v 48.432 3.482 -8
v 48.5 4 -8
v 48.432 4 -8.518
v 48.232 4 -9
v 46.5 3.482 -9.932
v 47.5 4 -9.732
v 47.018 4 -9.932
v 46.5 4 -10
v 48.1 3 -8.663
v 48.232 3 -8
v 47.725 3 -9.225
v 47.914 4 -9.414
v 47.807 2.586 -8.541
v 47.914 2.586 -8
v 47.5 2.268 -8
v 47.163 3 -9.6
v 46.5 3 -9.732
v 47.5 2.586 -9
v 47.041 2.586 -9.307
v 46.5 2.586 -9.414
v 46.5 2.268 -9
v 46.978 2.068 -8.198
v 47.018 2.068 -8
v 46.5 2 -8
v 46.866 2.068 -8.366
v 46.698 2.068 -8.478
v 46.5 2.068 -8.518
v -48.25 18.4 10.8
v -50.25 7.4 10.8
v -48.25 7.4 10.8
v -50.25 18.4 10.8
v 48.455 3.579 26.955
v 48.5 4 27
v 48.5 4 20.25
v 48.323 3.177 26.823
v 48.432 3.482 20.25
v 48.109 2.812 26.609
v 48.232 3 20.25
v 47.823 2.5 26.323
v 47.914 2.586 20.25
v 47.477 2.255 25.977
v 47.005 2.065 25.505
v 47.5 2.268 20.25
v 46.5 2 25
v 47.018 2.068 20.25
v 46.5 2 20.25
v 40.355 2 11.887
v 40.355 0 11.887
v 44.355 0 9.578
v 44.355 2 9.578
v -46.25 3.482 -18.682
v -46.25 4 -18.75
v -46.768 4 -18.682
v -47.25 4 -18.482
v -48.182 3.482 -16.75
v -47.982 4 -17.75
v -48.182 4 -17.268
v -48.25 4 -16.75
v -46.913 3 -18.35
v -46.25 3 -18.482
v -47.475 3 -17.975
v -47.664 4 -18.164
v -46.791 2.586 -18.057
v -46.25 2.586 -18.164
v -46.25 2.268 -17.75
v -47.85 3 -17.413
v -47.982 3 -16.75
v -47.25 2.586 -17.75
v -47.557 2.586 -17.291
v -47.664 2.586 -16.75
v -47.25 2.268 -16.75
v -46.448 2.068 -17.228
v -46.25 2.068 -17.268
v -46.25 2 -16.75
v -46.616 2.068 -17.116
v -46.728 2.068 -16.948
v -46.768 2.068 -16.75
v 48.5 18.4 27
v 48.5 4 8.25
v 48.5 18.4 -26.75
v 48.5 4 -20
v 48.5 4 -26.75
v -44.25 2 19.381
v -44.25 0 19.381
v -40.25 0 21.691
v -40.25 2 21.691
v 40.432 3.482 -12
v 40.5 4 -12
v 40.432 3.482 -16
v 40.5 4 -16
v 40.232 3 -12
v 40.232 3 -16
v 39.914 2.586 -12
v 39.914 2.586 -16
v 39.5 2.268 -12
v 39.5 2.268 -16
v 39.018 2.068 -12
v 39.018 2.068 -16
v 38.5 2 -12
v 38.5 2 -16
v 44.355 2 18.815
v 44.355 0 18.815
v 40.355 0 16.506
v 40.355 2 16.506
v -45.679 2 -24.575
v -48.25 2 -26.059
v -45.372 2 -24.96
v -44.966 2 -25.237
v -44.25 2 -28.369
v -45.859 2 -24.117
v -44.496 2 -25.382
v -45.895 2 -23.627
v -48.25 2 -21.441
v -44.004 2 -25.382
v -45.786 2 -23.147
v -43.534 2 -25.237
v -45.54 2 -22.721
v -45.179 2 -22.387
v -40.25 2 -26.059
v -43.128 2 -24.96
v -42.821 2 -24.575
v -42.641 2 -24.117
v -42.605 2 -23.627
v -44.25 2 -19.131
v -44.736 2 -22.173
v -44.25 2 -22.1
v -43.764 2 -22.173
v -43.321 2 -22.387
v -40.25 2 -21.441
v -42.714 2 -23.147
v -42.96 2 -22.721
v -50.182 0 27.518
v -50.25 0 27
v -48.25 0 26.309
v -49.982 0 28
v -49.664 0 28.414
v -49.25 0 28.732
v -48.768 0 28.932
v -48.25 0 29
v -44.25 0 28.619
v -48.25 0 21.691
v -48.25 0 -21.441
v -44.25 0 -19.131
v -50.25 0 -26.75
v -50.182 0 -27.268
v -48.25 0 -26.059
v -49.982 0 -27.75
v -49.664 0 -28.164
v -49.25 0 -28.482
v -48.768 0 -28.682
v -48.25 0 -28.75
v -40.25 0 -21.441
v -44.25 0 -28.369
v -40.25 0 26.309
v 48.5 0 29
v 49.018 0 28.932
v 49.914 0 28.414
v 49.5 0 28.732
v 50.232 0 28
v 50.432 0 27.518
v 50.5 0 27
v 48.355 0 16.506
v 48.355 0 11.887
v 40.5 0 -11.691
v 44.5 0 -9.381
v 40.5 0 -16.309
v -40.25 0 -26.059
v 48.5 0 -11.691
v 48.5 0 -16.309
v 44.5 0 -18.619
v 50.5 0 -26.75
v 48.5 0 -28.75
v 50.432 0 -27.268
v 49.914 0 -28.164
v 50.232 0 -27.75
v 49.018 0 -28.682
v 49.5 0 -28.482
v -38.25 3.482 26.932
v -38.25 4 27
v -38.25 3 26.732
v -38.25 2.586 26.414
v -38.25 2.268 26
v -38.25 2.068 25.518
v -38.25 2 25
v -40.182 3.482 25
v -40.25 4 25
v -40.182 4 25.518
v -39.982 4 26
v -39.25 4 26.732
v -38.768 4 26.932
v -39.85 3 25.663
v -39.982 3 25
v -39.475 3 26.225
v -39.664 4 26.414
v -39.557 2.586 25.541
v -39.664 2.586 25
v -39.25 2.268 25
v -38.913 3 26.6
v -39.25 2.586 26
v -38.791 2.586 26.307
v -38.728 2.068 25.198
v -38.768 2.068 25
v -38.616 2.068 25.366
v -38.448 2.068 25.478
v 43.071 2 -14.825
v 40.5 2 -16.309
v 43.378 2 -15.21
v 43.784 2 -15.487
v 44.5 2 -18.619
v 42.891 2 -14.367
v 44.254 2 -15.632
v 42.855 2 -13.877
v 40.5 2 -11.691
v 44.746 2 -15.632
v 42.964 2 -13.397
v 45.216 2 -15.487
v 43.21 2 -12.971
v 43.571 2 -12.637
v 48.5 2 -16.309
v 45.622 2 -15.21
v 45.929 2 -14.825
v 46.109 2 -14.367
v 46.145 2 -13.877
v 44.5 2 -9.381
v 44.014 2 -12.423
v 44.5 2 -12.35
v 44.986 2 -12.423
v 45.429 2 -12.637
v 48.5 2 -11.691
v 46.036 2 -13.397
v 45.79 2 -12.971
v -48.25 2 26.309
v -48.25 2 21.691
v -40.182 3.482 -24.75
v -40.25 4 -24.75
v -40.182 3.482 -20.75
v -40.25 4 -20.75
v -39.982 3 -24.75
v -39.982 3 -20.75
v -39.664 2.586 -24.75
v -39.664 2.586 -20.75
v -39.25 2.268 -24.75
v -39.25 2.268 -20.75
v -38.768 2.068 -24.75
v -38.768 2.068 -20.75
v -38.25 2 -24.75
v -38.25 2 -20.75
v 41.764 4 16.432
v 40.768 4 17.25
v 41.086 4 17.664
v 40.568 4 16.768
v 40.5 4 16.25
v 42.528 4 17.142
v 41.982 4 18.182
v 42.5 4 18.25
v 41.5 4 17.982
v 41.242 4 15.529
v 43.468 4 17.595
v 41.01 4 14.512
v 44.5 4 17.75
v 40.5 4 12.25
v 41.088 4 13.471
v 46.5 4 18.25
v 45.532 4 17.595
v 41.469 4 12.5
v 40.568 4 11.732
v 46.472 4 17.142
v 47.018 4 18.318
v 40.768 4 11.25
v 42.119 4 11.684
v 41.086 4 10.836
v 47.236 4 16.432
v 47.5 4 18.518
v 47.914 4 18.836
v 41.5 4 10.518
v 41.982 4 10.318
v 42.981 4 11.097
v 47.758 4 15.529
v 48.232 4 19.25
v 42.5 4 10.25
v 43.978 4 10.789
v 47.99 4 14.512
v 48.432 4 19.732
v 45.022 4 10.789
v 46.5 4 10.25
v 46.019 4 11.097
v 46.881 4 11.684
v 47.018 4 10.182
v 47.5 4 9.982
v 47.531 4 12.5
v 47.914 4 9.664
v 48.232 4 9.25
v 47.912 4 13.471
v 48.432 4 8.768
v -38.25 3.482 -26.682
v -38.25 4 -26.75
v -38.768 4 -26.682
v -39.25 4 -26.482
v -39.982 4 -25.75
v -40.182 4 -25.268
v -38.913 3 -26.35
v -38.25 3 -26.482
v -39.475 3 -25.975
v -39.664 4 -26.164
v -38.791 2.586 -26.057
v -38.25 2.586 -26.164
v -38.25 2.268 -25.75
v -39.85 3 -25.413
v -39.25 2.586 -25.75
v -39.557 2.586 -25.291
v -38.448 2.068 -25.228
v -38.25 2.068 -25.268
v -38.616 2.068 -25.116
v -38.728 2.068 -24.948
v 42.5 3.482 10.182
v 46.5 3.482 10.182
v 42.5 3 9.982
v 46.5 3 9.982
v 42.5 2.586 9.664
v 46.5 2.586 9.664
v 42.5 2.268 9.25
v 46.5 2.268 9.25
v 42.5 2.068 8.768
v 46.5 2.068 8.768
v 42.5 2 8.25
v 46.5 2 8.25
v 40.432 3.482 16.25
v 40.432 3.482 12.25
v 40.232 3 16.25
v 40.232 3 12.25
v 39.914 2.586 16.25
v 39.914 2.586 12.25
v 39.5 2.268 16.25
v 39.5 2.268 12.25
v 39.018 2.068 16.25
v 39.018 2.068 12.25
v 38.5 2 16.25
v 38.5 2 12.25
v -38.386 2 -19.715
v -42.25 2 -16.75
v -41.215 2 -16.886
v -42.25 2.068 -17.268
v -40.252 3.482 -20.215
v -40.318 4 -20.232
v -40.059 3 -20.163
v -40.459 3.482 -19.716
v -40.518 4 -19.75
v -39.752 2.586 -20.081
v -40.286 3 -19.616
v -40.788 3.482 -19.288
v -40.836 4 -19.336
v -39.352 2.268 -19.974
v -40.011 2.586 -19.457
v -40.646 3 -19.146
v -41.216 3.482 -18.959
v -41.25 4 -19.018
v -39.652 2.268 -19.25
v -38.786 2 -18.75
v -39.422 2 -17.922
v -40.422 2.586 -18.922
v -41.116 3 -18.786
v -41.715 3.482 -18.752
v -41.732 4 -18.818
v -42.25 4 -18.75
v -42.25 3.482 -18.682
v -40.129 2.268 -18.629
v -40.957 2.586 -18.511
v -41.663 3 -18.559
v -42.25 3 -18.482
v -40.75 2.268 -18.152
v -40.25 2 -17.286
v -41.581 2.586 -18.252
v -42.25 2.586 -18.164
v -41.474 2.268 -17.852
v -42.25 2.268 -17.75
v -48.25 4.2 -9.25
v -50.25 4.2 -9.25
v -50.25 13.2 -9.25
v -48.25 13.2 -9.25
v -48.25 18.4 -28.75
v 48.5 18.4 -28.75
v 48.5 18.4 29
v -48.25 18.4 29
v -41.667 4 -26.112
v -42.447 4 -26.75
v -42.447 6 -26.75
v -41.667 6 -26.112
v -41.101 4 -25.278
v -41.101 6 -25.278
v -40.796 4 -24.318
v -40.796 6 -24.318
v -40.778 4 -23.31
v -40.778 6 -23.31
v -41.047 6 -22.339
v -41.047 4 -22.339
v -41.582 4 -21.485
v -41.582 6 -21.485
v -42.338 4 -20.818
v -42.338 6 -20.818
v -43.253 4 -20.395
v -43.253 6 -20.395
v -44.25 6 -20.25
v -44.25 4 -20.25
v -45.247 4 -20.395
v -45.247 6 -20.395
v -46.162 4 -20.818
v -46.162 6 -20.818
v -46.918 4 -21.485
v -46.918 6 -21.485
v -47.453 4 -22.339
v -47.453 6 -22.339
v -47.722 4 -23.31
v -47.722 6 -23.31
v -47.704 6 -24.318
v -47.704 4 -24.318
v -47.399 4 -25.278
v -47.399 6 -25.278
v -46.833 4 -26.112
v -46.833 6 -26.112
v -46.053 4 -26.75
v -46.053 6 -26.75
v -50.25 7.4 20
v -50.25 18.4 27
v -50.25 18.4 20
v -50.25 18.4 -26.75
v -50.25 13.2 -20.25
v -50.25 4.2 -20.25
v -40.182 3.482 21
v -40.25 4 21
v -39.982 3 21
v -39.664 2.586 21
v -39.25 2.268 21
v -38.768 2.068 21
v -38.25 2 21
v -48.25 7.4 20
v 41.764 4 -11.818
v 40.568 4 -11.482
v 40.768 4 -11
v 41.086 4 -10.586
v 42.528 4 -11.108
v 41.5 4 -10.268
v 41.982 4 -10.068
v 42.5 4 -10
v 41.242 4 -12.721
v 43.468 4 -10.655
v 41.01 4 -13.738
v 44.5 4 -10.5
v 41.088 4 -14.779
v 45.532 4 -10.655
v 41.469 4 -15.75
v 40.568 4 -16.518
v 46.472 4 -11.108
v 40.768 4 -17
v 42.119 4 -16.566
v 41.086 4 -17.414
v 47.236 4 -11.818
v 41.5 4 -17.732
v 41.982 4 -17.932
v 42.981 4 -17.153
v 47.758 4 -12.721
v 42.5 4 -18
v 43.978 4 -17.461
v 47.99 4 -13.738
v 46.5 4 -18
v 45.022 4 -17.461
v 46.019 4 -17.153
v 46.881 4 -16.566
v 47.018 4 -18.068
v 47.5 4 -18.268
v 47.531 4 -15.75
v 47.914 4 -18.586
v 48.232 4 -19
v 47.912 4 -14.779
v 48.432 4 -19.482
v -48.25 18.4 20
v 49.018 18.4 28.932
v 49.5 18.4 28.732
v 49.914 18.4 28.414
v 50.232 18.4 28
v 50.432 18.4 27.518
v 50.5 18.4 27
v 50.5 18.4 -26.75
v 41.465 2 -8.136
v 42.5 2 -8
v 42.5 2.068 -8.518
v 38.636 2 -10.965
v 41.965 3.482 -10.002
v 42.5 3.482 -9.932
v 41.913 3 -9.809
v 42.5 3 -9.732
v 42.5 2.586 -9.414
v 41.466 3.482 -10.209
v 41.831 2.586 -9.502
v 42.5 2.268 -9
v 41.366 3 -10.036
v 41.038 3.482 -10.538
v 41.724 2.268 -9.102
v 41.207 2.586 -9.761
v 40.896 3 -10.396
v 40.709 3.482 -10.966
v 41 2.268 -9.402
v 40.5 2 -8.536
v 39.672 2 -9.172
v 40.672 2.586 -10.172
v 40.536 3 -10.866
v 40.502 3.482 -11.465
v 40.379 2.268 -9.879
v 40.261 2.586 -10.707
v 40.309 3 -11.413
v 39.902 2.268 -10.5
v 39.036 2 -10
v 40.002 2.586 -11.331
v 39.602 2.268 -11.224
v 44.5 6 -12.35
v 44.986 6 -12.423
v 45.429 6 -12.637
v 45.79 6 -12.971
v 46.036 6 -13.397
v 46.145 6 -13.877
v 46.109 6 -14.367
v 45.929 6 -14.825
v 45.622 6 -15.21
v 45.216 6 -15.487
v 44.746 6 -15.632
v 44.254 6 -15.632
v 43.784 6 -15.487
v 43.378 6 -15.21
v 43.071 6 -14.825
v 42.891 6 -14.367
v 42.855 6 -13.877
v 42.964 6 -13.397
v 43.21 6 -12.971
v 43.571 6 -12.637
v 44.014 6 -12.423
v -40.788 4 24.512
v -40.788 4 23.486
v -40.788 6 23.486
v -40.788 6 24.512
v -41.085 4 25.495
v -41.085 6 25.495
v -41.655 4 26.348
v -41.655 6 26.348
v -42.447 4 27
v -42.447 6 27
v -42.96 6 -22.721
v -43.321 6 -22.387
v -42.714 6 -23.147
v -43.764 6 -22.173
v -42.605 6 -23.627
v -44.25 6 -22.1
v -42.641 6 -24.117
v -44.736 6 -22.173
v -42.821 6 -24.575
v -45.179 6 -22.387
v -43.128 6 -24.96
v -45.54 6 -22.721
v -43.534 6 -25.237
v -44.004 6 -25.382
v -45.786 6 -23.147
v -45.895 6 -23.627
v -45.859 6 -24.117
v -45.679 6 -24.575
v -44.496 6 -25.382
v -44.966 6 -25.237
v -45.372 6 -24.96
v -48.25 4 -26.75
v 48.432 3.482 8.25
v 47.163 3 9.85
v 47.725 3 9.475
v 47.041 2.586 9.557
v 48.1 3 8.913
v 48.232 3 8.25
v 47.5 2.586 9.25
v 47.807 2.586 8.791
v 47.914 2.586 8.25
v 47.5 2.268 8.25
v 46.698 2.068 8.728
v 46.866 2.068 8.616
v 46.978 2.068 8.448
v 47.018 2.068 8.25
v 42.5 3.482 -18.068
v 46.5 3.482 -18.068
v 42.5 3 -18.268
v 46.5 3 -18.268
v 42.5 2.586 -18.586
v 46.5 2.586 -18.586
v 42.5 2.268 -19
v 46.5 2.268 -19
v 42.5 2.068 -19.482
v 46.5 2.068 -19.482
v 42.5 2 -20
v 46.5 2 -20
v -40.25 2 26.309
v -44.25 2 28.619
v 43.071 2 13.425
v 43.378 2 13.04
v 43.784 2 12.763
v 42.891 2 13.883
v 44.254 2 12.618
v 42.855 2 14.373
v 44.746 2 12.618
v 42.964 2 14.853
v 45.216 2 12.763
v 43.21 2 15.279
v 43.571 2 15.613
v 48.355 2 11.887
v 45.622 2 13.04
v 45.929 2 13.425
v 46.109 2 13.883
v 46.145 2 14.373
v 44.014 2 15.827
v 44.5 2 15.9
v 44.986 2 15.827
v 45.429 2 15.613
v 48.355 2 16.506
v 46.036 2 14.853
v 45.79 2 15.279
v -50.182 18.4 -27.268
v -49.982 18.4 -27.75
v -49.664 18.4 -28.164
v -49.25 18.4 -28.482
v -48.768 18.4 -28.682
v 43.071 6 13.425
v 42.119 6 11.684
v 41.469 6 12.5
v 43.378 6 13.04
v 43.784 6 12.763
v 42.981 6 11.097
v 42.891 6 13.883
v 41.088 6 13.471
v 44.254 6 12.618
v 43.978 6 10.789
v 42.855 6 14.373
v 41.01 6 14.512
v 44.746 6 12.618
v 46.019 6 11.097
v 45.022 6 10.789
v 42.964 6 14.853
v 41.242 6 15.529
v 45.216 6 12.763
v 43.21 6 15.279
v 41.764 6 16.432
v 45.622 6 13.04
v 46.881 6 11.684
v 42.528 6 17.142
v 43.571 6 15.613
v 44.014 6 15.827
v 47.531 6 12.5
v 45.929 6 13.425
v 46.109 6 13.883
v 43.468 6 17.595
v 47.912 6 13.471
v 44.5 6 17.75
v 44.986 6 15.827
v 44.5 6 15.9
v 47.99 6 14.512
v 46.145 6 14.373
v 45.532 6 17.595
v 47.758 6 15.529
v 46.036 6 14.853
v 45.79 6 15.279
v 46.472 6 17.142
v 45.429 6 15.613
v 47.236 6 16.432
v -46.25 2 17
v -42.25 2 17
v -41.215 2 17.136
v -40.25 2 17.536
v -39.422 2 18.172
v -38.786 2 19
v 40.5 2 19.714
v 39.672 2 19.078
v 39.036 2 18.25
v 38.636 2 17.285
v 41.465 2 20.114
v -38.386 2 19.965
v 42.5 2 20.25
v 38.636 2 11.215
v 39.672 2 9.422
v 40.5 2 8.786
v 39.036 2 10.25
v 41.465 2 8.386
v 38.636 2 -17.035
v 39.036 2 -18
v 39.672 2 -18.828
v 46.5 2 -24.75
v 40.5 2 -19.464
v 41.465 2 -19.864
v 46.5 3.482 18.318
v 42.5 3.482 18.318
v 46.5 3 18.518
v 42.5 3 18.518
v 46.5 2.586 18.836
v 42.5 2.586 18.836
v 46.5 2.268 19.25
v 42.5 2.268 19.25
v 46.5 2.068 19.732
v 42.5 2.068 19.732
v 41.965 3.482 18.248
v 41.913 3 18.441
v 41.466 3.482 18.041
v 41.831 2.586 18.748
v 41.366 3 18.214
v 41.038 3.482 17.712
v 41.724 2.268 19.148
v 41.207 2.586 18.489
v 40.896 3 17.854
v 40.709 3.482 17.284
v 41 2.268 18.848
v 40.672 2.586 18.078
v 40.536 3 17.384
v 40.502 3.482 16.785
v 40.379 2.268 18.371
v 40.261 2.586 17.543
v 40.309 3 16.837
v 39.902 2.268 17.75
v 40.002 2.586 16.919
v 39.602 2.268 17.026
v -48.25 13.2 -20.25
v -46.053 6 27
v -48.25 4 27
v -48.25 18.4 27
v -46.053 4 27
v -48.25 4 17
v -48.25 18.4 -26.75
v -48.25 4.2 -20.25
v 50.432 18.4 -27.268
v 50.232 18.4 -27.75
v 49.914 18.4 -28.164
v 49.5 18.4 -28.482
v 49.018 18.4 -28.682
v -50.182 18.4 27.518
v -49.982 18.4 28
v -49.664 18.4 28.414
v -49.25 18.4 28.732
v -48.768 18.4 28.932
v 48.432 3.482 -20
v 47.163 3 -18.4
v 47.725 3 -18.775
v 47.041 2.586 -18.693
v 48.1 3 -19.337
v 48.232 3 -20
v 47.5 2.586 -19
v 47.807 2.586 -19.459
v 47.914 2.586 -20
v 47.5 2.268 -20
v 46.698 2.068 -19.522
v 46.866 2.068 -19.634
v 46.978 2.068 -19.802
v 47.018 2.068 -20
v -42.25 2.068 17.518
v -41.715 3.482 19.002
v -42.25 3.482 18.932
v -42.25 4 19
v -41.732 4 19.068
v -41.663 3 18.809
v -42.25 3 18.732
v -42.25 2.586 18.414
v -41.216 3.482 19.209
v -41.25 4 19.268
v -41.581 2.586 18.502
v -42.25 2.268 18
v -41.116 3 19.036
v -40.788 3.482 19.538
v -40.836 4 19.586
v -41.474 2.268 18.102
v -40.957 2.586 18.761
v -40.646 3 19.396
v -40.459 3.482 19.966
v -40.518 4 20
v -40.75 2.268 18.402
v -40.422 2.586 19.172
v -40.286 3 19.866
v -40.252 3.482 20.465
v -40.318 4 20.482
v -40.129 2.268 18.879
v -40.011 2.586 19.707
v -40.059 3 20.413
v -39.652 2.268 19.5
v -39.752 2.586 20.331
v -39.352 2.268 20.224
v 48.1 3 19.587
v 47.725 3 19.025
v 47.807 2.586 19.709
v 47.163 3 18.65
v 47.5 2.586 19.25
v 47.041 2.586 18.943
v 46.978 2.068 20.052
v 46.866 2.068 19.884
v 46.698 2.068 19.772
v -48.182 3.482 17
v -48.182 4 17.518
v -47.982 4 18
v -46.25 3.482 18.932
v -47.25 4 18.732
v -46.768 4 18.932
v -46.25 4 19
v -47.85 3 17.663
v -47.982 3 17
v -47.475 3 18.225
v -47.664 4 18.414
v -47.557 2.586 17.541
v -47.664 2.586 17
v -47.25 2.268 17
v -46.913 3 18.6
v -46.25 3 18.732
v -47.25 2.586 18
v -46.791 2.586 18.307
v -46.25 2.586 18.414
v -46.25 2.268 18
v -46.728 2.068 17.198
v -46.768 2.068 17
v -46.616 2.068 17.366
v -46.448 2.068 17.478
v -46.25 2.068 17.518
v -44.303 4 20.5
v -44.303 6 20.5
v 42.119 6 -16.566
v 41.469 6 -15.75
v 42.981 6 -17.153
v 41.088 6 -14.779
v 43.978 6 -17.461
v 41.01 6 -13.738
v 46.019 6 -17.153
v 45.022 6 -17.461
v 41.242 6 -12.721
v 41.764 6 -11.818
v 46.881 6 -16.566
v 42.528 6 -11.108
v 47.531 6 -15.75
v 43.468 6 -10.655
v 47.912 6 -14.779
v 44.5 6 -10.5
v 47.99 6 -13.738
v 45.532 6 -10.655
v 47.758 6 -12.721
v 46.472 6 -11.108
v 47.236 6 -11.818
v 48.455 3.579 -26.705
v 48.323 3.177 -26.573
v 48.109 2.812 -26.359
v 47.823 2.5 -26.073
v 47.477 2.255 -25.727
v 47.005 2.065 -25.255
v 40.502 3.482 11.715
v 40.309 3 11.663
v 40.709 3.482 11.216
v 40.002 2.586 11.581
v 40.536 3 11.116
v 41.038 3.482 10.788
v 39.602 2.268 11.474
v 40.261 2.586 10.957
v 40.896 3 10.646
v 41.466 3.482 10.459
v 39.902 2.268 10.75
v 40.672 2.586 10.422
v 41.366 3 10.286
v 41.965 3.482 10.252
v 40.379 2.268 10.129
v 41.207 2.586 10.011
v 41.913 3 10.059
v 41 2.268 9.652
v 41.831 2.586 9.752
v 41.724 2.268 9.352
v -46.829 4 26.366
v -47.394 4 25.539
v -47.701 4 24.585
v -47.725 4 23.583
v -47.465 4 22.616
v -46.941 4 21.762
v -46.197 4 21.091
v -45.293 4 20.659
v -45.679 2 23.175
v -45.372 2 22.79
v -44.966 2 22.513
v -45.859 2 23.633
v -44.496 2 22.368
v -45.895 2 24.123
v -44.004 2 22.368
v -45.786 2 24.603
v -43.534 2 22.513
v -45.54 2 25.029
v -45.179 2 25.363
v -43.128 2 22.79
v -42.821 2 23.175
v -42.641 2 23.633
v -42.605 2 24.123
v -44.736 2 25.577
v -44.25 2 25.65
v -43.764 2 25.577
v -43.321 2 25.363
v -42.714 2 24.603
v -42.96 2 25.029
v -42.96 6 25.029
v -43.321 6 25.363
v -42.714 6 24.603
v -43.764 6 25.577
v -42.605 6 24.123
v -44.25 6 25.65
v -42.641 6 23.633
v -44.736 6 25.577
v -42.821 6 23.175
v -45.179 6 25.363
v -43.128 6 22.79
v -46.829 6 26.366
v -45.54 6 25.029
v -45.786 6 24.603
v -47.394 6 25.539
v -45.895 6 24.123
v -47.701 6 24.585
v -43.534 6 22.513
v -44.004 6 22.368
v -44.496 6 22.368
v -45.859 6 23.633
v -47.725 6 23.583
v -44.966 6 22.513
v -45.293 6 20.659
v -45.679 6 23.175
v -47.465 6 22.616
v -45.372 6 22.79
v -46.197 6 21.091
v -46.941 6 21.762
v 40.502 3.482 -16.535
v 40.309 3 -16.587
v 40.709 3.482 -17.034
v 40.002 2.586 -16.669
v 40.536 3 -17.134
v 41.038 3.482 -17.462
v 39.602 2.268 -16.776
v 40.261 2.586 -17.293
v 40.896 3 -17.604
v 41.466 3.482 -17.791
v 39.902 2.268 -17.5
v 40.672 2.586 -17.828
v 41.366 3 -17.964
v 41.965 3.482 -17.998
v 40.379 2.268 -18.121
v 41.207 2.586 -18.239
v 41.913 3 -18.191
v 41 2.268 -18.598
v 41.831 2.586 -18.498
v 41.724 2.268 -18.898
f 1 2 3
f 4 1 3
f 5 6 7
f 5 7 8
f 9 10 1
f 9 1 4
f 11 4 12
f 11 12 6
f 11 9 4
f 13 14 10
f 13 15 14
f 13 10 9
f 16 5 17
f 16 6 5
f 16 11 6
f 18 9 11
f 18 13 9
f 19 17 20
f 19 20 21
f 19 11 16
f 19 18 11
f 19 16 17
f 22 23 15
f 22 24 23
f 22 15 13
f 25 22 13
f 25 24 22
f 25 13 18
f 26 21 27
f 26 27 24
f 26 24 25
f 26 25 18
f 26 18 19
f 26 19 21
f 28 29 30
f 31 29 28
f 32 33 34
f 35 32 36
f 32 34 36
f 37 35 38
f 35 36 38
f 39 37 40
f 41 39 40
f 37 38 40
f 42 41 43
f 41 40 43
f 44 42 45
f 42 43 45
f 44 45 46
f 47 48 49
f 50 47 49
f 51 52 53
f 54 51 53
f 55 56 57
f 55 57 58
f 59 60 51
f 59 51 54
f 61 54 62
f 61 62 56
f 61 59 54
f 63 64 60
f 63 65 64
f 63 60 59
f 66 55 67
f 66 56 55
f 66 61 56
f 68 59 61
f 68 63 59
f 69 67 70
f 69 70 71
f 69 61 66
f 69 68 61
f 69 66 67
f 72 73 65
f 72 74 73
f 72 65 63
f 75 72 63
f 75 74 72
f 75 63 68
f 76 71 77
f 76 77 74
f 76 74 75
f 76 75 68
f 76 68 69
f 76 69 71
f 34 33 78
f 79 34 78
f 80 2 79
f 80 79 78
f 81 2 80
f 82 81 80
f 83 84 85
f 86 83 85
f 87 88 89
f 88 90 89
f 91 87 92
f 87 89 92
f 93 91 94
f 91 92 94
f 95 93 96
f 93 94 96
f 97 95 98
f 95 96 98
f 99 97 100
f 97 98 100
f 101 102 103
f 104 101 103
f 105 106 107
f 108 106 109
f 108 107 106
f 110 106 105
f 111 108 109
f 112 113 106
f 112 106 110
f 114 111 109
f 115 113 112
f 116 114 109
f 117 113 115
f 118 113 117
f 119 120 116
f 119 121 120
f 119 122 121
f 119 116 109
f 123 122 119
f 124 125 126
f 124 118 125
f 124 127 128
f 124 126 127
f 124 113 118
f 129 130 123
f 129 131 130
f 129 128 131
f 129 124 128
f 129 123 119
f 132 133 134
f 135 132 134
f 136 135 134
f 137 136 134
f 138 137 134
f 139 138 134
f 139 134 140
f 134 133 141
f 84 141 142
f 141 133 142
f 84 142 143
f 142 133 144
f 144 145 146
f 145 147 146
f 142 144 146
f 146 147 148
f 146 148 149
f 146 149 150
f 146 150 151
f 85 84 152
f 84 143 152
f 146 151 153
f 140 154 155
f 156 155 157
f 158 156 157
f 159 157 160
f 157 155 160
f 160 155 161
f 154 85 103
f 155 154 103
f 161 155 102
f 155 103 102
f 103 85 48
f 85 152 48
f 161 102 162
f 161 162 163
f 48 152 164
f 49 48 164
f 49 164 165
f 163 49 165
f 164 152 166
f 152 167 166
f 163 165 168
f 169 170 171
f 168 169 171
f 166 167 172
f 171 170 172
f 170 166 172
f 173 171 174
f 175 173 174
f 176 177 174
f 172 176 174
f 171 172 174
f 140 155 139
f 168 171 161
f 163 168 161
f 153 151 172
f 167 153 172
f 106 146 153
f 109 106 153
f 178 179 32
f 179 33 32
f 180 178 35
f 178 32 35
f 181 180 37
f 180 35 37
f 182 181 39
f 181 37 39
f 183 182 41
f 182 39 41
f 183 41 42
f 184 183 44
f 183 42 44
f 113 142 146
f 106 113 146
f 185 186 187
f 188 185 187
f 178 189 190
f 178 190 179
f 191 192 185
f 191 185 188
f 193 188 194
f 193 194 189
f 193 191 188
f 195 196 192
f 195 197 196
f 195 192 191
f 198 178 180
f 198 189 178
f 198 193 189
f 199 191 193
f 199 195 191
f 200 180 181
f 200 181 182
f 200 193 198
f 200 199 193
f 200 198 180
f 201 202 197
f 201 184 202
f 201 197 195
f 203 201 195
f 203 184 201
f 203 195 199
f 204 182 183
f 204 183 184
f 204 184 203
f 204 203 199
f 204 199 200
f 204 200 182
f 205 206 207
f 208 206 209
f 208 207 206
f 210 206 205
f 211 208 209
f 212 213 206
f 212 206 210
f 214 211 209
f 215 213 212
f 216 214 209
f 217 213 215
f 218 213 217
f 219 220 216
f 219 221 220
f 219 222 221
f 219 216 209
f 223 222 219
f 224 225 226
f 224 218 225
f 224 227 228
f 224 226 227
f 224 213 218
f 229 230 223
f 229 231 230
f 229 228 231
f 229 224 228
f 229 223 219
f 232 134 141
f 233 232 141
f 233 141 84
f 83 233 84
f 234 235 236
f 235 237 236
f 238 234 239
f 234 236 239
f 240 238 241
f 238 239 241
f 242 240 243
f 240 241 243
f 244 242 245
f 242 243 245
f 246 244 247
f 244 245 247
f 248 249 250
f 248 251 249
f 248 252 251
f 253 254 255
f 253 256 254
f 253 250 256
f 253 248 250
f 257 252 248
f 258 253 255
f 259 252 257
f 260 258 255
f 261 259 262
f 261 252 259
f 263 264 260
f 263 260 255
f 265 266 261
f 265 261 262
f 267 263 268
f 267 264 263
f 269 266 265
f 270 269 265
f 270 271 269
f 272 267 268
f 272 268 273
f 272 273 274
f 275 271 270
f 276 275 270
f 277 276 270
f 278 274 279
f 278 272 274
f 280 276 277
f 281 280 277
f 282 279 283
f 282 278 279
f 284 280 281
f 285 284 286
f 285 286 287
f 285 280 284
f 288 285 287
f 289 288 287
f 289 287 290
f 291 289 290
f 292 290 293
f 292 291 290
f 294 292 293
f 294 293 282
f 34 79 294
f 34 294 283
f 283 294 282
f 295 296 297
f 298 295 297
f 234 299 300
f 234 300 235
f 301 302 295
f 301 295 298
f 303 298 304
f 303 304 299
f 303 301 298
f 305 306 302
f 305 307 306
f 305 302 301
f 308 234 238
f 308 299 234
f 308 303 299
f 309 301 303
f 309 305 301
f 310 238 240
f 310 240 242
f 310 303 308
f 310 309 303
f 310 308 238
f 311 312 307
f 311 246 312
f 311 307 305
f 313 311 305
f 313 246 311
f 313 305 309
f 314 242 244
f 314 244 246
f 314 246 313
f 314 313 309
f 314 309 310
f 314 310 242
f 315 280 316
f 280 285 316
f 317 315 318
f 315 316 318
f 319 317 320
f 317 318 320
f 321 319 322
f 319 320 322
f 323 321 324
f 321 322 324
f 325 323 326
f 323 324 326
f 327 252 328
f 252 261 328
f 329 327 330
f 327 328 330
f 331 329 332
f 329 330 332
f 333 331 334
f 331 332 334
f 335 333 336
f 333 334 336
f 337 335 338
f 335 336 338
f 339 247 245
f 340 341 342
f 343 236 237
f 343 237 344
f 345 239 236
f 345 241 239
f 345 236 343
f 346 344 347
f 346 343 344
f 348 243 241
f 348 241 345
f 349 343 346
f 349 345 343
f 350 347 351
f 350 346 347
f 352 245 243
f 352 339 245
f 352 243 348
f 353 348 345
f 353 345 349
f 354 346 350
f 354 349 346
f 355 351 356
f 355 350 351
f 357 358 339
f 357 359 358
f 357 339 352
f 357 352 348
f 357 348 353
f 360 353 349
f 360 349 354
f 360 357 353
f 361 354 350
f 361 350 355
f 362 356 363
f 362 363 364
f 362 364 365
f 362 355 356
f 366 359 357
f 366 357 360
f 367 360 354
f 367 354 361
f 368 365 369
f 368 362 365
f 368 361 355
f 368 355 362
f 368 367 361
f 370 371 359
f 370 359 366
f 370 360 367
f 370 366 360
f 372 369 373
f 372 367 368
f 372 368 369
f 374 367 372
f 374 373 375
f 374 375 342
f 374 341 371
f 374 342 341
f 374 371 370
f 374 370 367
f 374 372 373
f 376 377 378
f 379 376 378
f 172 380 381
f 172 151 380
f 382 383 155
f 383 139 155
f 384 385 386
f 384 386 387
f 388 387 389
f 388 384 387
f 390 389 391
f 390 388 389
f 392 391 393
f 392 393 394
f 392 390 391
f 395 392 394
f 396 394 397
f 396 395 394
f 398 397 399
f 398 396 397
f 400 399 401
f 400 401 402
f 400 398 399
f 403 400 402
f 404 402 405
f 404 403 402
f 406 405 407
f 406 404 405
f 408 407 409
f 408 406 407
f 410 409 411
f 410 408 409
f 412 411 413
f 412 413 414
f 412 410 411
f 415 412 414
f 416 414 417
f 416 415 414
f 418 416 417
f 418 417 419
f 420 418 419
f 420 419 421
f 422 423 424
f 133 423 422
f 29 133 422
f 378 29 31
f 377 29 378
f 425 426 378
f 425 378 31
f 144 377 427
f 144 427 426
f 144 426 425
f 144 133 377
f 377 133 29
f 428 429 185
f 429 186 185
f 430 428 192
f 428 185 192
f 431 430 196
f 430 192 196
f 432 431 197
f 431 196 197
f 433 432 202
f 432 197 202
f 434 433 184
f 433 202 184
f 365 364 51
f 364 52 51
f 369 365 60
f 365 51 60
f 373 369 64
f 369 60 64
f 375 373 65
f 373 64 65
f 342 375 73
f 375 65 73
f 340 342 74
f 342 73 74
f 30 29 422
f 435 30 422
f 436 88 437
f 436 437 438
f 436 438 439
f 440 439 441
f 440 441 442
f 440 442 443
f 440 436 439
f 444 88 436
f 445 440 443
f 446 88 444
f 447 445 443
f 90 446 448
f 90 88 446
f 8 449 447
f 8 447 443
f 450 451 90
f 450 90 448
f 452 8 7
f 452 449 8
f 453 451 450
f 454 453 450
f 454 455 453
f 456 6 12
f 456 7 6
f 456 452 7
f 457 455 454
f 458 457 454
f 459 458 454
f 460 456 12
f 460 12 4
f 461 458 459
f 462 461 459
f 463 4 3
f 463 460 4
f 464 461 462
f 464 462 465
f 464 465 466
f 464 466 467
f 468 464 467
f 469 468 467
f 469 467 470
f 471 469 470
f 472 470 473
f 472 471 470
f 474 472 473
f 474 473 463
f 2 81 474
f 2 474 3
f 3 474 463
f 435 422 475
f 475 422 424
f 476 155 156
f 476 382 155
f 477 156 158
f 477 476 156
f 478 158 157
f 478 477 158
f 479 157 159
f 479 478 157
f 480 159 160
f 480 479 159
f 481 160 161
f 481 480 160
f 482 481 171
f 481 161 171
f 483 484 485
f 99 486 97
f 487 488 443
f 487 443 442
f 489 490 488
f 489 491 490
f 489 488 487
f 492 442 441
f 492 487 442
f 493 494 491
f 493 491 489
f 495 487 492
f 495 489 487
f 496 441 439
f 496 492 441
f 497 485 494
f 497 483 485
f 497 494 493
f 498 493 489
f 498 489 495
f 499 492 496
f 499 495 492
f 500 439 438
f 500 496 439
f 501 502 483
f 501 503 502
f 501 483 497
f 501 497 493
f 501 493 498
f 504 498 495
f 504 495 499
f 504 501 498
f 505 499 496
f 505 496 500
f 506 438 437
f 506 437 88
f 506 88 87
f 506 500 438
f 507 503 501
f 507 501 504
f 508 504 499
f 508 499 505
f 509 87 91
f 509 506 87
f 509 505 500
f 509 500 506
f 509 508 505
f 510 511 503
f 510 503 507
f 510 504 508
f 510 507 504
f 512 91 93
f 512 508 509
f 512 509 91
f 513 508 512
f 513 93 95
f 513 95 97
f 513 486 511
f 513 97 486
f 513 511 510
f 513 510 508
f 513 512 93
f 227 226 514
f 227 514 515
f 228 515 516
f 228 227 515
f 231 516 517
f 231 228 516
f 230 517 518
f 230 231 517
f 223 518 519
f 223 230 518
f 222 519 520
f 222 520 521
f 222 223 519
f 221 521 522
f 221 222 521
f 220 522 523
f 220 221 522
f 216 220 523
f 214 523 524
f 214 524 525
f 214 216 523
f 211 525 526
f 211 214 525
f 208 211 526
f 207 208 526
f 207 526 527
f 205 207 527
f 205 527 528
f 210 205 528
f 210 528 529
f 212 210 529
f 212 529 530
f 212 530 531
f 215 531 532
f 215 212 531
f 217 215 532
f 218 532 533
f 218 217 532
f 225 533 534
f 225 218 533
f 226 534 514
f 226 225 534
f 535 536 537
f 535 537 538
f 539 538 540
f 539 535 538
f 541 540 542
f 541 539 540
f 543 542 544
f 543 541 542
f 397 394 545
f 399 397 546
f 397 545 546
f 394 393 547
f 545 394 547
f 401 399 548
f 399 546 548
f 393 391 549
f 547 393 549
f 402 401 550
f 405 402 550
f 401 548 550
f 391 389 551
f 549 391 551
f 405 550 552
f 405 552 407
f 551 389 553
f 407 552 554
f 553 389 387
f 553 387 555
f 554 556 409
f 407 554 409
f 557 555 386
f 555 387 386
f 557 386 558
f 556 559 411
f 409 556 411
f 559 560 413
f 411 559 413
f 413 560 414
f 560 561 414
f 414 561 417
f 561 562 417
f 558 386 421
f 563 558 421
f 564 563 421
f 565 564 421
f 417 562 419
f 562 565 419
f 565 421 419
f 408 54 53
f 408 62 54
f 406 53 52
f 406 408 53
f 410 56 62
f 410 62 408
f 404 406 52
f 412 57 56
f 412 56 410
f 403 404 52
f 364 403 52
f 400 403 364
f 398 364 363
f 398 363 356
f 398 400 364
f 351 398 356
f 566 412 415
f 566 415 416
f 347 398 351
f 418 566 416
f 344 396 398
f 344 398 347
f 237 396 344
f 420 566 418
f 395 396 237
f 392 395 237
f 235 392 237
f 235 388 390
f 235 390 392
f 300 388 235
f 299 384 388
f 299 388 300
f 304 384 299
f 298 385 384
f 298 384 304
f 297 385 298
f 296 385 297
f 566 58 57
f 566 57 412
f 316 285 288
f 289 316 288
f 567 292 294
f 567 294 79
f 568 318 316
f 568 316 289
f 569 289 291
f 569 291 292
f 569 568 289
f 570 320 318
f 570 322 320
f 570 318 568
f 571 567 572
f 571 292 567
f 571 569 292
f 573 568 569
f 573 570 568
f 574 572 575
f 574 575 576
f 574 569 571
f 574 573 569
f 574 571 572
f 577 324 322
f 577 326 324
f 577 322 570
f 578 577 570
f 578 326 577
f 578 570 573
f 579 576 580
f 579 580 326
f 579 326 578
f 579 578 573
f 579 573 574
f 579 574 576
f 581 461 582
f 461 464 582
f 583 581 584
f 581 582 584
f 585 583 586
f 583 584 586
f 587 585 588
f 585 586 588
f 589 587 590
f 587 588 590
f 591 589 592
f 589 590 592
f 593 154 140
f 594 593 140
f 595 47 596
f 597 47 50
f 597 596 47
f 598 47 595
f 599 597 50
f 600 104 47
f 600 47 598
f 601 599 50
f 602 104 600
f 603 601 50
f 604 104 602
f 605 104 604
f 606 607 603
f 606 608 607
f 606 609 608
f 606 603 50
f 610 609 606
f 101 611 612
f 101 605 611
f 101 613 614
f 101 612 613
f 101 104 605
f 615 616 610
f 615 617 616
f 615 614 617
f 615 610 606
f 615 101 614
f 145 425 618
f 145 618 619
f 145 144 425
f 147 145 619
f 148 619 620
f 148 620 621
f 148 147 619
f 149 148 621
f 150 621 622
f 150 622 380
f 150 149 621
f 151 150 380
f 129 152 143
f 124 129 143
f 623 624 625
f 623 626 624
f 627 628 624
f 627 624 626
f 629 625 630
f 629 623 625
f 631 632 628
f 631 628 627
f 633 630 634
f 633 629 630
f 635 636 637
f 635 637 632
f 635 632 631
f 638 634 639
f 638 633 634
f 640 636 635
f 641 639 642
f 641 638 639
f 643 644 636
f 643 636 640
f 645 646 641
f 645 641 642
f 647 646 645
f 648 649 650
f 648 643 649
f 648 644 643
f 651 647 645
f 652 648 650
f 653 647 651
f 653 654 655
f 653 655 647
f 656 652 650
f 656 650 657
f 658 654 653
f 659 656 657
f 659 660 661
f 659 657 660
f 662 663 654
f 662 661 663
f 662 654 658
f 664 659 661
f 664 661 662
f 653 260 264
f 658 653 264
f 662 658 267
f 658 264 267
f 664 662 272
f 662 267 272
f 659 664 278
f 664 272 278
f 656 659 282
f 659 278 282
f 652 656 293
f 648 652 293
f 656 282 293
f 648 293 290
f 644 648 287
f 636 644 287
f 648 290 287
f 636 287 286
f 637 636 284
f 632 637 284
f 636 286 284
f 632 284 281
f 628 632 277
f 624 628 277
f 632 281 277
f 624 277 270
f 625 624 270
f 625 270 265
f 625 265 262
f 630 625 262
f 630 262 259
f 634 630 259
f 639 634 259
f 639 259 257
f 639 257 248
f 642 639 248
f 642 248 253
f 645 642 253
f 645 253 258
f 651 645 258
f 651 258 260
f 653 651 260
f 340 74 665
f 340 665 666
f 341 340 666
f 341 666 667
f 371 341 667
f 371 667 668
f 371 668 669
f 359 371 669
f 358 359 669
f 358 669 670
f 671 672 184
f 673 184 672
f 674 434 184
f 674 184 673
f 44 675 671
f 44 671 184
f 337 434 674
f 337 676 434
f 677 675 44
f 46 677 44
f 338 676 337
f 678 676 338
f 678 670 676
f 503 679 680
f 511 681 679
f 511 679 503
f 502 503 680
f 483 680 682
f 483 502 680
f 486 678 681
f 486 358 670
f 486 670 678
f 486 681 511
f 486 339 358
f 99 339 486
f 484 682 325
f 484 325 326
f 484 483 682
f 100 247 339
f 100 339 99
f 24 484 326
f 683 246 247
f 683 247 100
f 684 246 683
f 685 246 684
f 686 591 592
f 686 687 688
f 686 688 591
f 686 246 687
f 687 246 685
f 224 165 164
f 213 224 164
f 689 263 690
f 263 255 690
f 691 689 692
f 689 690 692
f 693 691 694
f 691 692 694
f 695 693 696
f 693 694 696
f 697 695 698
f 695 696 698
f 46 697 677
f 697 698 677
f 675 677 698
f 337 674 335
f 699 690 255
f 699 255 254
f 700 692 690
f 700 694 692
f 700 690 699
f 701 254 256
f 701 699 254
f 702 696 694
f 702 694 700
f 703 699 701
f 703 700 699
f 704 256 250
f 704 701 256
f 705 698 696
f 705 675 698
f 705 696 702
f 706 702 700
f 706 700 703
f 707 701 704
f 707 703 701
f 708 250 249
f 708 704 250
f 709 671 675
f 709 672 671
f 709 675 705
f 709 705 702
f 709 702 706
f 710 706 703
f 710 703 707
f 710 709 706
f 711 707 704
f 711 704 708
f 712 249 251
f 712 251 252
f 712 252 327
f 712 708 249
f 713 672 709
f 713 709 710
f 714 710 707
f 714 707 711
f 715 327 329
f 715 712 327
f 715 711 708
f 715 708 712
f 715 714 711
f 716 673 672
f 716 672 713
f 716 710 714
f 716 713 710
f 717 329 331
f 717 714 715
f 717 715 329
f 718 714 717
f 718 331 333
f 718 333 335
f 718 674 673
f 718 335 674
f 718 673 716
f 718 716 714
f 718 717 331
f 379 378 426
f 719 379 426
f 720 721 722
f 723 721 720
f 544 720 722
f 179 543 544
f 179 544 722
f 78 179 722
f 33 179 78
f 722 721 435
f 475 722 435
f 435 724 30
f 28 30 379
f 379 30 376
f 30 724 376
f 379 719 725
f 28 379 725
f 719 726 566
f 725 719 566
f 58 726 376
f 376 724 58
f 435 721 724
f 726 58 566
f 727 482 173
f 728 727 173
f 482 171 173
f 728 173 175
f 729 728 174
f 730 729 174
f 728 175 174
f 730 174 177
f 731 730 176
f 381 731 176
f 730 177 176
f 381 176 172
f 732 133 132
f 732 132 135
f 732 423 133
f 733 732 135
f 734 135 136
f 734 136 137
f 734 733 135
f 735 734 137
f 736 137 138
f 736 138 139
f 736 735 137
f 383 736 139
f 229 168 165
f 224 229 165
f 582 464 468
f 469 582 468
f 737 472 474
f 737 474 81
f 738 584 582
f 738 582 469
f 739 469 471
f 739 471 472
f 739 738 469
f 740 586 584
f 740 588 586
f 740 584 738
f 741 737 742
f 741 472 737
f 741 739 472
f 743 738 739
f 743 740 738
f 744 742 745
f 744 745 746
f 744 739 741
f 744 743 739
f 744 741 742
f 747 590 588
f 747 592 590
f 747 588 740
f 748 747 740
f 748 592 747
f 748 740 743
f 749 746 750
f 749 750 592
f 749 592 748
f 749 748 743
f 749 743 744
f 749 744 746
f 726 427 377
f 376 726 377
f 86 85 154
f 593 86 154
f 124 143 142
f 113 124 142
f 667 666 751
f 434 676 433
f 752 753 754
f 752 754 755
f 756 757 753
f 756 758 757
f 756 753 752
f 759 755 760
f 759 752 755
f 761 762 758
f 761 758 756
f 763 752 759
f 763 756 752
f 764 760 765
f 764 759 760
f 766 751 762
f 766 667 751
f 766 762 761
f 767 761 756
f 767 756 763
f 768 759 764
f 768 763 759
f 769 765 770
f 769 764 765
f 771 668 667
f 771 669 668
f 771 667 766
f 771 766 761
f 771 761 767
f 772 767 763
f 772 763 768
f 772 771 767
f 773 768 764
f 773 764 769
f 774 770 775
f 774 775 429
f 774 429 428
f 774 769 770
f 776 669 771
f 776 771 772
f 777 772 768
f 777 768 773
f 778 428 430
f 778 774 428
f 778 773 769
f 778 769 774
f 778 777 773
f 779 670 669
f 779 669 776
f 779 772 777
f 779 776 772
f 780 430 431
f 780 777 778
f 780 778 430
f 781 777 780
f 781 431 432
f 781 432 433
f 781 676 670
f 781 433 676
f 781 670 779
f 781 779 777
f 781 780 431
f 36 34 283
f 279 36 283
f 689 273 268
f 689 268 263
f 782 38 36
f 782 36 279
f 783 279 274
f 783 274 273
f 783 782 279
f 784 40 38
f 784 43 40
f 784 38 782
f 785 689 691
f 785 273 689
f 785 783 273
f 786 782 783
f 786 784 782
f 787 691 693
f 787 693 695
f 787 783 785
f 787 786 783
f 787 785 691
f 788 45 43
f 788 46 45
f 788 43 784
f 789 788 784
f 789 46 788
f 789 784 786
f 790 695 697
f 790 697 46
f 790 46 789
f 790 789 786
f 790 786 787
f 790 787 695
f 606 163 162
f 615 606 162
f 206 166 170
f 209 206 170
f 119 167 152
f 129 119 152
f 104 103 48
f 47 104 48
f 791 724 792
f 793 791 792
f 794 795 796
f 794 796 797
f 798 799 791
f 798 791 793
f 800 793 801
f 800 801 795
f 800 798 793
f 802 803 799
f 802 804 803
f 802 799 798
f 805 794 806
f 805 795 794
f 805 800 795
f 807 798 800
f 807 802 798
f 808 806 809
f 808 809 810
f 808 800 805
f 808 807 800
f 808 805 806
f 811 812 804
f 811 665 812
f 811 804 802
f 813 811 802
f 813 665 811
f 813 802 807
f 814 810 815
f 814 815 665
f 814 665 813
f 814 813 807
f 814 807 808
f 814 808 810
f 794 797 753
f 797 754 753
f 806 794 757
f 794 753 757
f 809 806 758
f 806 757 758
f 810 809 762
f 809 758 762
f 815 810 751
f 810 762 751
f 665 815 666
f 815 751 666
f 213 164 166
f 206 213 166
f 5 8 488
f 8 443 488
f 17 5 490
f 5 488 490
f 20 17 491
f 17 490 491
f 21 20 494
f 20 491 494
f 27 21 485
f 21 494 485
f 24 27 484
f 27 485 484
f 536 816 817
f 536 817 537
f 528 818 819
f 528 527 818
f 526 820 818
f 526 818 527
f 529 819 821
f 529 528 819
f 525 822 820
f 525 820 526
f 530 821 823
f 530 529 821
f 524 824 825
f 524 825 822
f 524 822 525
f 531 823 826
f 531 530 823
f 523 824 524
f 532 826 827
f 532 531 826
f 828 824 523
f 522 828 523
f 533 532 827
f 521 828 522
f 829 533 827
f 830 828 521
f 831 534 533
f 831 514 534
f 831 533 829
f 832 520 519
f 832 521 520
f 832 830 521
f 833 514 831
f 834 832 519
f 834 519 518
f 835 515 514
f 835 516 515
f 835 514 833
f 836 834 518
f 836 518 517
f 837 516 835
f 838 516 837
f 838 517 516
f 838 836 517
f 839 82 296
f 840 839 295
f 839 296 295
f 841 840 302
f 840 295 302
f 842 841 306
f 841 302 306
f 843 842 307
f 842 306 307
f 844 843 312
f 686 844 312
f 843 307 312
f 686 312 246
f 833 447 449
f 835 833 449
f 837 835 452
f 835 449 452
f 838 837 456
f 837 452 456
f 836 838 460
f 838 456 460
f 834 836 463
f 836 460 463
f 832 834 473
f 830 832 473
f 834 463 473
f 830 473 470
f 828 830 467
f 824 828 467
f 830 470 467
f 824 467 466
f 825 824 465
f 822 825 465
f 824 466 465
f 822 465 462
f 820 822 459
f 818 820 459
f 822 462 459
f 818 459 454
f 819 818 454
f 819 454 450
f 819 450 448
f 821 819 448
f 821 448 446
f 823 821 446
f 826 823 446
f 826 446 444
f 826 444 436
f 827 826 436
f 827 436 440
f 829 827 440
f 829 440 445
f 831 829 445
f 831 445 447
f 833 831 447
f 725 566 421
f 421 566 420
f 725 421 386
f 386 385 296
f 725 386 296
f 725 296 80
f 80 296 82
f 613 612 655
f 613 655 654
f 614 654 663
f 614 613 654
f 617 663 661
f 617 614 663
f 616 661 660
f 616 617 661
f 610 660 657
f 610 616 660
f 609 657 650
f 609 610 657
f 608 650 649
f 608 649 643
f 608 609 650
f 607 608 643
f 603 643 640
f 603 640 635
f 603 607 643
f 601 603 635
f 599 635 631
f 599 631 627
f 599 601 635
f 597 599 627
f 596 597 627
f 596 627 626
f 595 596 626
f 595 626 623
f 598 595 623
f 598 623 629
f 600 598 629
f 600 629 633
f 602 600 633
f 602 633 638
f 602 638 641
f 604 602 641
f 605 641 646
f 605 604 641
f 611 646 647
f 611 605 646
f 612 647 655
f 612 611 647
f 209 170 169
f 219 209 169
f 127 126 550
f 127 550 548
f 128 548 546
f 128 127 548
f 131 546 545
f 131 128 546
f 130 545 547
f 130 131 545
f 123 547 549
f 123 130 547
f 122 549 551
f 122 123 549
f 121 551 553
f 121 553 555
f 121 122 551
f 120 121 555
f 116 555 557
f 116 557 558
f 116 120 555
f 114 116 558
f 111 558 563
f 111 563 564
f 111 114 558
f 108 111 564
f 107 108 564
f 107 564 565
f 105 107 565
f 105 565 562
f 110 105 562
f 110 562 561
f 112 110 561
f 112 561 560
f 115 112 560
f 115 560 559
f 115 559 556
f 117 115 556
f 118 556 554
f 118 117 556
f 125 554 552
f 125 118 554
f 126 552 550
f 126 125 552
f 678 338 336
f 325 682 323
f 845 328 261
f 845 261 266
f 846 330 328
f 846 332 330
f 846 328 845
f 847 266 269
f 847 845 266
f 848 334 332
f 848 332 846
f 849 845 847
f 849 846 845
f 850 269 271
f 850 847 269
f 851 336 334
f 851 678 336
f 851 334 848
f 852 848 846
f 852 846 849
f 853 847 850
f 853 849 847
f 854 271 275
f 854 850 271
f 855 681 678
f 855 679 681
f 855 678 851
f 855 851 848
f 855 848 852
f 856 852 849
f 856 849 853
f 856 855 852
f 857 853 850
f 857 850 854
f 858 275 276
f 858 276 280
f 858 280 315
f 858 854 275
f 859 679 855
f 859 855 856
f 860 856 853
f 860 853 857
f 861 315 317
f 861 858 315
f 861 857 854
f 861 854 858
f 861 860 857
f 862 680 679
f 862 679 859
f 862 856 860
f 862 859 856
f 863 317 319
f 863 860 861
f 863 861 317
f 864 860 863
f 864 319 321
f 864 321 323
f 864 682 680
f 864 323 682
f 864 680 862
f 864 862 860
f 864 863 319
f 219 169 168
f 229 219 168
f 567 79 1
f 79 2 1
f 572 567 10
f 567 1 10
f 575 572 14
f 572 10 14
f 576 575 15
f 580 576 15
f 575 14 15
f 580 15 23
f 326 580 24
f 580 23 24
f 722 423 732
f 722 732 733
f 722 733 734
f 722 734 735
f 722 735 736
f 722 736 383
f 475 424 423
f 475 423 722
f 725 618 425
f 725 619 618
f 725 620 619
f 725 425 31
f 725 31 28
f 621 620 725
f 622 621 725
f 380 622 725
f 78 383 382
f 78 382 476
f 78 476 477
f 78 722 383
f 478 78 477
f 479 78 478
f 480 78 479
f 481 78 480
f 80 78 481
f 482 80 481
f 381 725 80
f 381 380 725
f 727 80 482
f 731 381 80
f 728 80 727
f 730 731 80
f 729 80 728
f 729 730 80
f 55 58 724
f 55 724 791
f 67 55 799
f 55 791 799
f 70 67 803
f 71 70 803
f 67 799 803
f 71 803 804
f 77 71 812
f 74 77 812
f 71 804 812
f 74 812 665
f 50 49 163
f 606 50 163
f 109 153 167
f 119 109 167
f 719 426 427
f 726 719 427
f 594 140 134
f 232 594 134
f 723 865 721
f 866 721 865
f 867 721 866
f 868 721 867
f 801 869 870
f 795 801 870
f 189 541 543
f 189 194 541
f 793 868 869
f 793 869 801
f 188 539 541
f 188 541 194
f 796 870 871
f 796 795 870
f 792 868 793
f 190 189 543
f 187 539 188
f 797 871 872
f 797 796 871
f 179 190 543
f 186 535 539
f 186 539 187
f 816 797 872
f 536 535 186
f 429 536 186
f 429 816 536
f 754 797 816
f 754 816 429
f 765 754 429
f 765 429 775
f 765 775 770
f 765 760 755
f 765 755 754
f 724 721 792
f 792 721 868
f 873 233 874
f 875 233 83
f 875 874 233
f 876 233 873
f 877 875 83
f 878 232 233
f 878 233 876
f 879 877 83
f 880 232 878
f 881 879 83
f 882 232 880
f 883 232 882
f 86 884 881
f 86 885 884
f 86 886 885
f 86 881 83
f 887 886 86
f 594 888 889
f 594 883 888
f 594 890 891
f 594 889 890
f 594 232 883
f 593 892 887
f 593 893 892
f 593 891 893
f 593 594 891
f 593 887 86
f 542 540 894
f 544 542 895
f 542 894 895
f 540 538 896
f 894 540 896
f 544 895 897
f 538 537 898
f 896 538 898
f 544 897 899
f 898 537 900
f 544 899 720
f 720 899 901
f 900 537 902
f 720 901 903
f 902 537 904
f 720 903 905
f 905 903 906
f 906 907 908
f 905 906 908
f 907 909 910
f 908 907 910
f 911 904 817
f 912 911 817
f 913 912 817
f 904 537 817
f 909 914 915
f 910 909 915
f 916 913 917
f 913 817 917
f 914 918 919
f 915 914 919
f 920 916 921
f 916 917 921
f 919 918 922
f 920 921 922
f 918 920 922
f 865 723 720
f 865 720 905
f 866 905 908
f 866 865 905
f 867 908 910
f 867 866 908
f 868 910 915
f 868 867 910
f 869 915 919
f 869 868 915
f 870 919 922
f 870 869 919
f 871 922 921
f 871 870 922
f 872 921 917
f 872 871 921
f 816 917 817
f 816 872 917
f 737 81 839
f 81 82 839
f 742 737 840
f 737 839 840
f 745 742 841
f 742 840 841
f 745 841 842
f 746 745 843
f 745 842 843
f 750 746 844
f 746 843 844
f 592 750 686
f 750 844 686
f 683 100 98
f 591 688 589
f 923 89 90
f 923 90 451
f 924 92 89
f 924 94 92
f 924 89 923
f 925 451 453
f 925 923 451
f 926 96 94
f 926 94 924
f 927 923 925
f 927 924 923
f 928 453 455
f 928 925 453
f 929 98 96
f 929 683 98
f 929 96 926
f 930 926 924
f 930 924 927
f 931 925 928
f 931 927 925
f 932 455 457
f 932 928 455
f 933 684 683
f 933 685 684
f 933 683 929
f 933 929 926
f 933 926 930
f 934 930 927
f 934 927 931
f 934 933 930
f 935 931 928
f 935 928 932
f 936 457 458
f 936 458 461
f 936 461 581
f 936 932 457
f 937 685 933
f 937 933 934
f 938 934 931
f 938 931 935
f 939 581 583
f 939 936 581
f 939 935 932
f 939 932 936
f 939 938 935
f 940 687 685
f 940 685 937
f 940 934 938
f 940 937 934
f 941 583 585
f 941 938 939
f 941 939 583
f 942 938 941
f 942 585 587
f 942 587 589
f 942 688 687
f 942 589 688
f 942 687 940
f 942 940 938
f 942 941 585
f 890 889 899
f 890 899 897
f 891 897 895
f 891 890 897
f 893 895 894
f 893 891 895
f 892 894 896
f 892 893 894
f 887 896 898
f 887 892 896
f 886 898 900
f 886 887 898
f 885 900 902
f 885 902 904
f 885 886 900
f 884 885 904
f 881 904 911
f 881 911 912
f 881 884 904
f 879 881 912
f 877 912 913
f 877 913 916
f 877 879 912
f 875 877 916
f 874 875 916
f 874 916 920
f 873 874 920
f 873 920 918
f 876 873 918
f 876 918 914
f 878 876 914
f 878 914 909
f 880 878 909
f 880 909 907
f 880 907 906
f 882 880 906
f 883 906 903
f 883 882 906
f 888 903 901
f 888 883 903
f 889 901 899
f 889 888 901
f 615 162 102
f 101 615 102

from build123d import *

# Parameters (mm, degrees)
SKETCH1_W           = 100.75
SKETCH1_H           = 57.75
SKETCH1_W_2         = 96.75
SKETCH1_H_2         = 53.75
SKETCH1_R           = 1.65
BOSS_EXTRUDE1_DEPTH = 2
SKETCH2_R           = 3.5
SKETCH2_R_2         = 1.65
BOSS_EXTRUDE2_DEPTH = 4
SKETCH3_W           = 100.75
SKETCH3_H           = 57.75
SKETCH3_W_2         = 96.75
SKETCH3_H_2         = 53.75
BOSS_EXTRUDE3_DEPTH = 16.4
FILLET1_R           = 2
SKETCH5_W           = 8
SKETCH5_H           = 8
SKETCH5_R           = 1.65
BOSS_EXTRUDE4_DEPTH = 2
FILLET3_R           = 2
FILLET4_R           = 2
SKETCH6_W           = 9.2
SKETCH6_H           = 11
SKETCH6_W_2         = 8
SKETCH6_H_2         = 2.6
CUT_EXTRUDE2_DEPTH  = 2
CUT_EXTRUDE3_DEPTH  = 2


with BuildPart() as part:
    # Sketch1 → Boss-Extrude1 (new body)
    # profile 1 of 2: a face of its own
    with BuildSketch(Plane(origin=(0, 0, 0), x_dir=(1, 0, 0), z_dir=(0, 1, 0))):
        with Locations((0.125, -0.125)):
            Rectangle(SKETCH1_W, SKETCH1_H)
        with Locations((0.125, -0.125)):
            Rectangle(SKETCH1_W_2, SKETCH1_H_2, mode=Mode.SUBTRACT)
    # profile 2 of 2: a face of its own
    with BuildSketch(Plane(origin=(0, 0, 0), x_dir=(1, 0, 0), z_dir=(0, 1, 0))):
        with Locations((0.125, -0.125)):
            Rectangle(SKETCH1_W_2, SKETCH1_H_2)
        with Locations(Location((-44.25, -24, 0), (0, 0, 270))):
            Circle(SKETCH1_R, mode=Mode.SUBTRACT)
        with Locations(Location((-44.25, 23.75, 0), (0, 0, 270))):
            Circle(SKETCH1_R, mode=Mode.SUBTRACT)
        with Locations(Location((44.5, 14, 0), (0, 0, 270))):
            Circle(SKETCH1_R, mode=Mode.SUBTRACT)
        with Locations(Location((44.5, -14.25, 0), (0, 0, 270))):
            Circle(SKETCH1_R, mode=Mode.SUBTRACT)
    extrude(amount=BOSS_EXTRUDE1_DEPTH)

    # Sketch2 → Boss-Extrude2 (add)
    # profile 1 of 4: a face of its own
    with BuildSketch(Plane(origin=(0, 2, 0), x_dir=(1, 0, 0), z_dir=(0, 1, 0))):
        with Locations(Location((44.5, 14, 0), (0, 0, 270))):
            Circle(SKETCH2_R)
        with Locations(Location((44.5, 14, 0), (0, 0, 270))):
            Circle(SKETCH2_R_2, mode=Mode.SUBTRACT)
    # profile 2 of 4: a face of its own
    with BuildSketch(Plane(origin=(0, 2, 0), x_dir=(1, 0, 0), z_dir=(0, 1, 0))):
        with Locations(Location((44.5, -14.25, 0), (0, 0, 270))):
            Circle(SKETCH2_R)
        with Locations(Location((44.5, -14.25, 0), (0, 0, 270))):
            Circle(SKETCH2_R_2, mode=Mode.SUBTRACT)
    # profile 3 of 4: a face of its own
    with BuildSketch(Plane(origin=(0, 2, 0), x_dir=(1, 0, 0), z_dir=(0, 1, 0))):
        with BuildLine():
            Line((-44.303434376, -20.500407914), (-40.787920243, -23.486187041))
            ThreePointArc((-40.787920243, -23.486187041), (-41.085130973, -25.494524687), (-42.447224362, -27))
            Line((-42.447224362, -27), (-46.052775638, -27))
            ThreePointArc((-46.052775638, -27), (-47.629726797, -23.090358985), (-44.303434376, -20.500407914))
        make_face()
        with Locations(Location((-44.25, -24, 0), (0, 0, 270))):
            Circle(SKETCH2_R_2, mode=Mode.SUBTRACT)
    # profile 4 of 4: a face of its own
    with BuildSketch(Plane(origin=(0, 2, 0), x_dir=(1, 0, 0), z_dir=(0, 1, 0))):
        with BuildLine():
            Line((-46.052775638, 26.75), (-42.447224362, 26.75))
            ThreePointArc((-42.447224362, 26.75), (-44.25, 20.25), (-46.052775638, 26.75))
        make_face()
        with Locations(Location((-44.25, 23.75, 0), (0, 0, 270))):
            Circle(SKETCH2_R_2, mode=Mode.SUBTRACT)
    extrude(amount=BOSS_EXTRUDE2_DEPTH)

    # Sketch3 → Boss-Extrude3 (add)
    with BuildSketch(Plane(origin=(0, 2, 0), x_dir=(1, 0, 0), z_dir=(0, 1, 0))):
        with Locations((0.125, -0.125)):
            Rectangle(SKETCH3_W, SKETCH3_H)
        with Locations((0.125, -0.125)):
            Rectangle(SKETCH3_W_2, SKETCH3_H_2, mode=Mode.SUBTRACT)
    extrude(amount=BOSS_EXTRUDE3_DEPTH)

    # Fillet1
    fillet1_edges = [part.edges().sort_by_distance(p)[0] for p in [
        (50.5, 9.2, 29),
        (-50.25, 9.2, 29),
        (-50.25, 9.2, -28.75),
        (50.5, 9.2, -28.75),
    ]]
    fillet(fillet1_edges, radius=FILLET1_R)

    # Sketch5 → Boss-Extrude4 (add)
    # profile 1 of 4: a face of its own
    with BuildSketch(Plane(origin=(0, 2, 0), x_dir=(1, 0, 0), z_dir=(0, 1, 0))):
        with Locations((44.5, 14)):
            Rectangle(SKETCH5_W, SKETCH5_H)
        with Locations(Location((44.5, 14, 0), (0, 0, 270))):
            Circle(SKETCH5_R, mode=Mode.SUBTRACT)
    # profile 2 of 4: a face of its own
    with BuildSketch(Plane(origin=(0, 2, 0), x_dir=(1, 0, 0), z_dir=(0, 1, 0))):
        with Locations((44.5, -14.25)):
            Rectangle(SKETCH5_W, SKETCH5_H)
        with Locations(Location((44.5, -14.25, 0), (0, 0, 270))):
            Circle(SKETCH5_R, mode=Mode.SUBTRACT)
    # profile 3 of 4: a face of its own
    with BuildSketch(Plane(origin=(0, 2, 0), x_dir=(1, 0, 0), z_dir=(0, 1, 0))):
        with Locations((-44.25, -23)):
            Rectangle(SKETCH5_W, SKETCH5_H)
        with Locations(Location((-44.25, -24, 0), (0, 0, 270))):
            Circle(SKETCH5_R, mode=Mode.SUBTRACT)
    # profile 4 of 4: a face of its own
    with BuildSketch(Plane(origin=(0, 2, 0), x_dir=(1, 0, 0), z_dir=(0, 1, 0))):
        with Locations((-44.25, 22.75)):
            Rectangle(SKETCH5_W, SKETCH5_H)
        with Locations(Location((-44.25, 23.75, 0), (0, 0, 270))):
            Circle(SKETCH5_R, mode=Mode.SUBTRACT)
    extrude(amount=BOSS_EXTRUDE4_DEPTH)

    # Fillet3
    fillet3_edges = [part.edges().sort_by_distance(p)[0] for p in [
        (40.5, 3, -18),
        (40.5, 3, -10),
        (48.5, 3, -10),
        (48.5, 3, -18),
        (40.5, 3, 10.25),
        (40.5, 3, 18.25),
        (48.5, 3, 18.25),
        (48.5, 3, 10.25),
        (-48.25, 3, 19),
        (-40.25, 3, 27),
        (-40.25, 3, 19),
        (-40.25, 3, -26.75),
        (-48.25, 3, -18.75),
        (-40.25, 3, -18.75),
    ]]
    fillet(fillet3_edges, radius=FILLET3_R)

    # Fillet4
    fillet4_edges = [part.edges().sort_by_distance(p)[0] for p in [
        (48.5, 2, -23.375),
        (47.914213562, 2, -18.585786438),
        (44.5, 2, -18),
        (41.085786438, 2, -17.414213562),
        (48.5, 2, 23.625),
        (47.914213562, 2, 18.835786438),
        (44.5, 2, 18.25),
        (41.085786438, 2, 17.664213562),
        (40.5, 2, 14.25),
        (41.085786438, 2, 10.835786438),
        (44.5, 2, 10.25),
        (47.914213562, 2, 9.664213562),
        (48.5, 2, 0.125),
        (47.914213562, 2, -9.414213562),
        (44.5, 2, -10),
        (41.085786438, 2, -10.585786438),
        (5.125, 2, 27),
        (-39.664213562, 2, 26.414213562),
        (-40.25, 2, 23),
        (-40.835786438, 2, 19.585786438),
        (5.125, 2, -26.75),
        (-39.664213562, 2, -26.164213562),
        (-40.25, 2, -22.75),
        (-40.835786438, 2, -19.335786438),
        (-44.25, 2, -18.75),
        (-47.664213562, 2, -18.164213562),
        (-48.25, 2, 0.125),
        (-47.664213562, 2, 18.414213562),
        (40.5, 2, -14),
        (-44.25, 2, 19),
    ]]
    fillet(fillet4_edges, radius=FILLET4_R - 0.0001)  # a hair under: the kernel refuses the full size

    # Sketch6 → Cut-Extrude2 (cut)
    with BuildSketch(Plane.ZY.offset(50.25)):
        with Locations((15.4, 12.9)):
            Rectangle(SKETCH6_W, SKETCH6_H)
        Polygon((-18.75, 7.4), (-20.25, 7.4), (-20.25, 4.2), (-9.25, 4.2), (-9.25, 7.4), (-10.75, 7.4), align=None)
        Polygon((-20.25, 13.2), (-20.25, 7.4), (-18.75, 7.4), (-18.75, 10), (-10.75, 10), (-10.75, 7.4), (-9.25, 7.4), (-9.25, 13.2), align=None)
        with Locations((-14.75, 8.7)):
            Rectangle(SKETCH6_W_2, SKETCH6_H_2)
    extrude(amount=-CUT_EXTRUDE2_DEPTH, mode=Mode.SUBTRACT)

    # Sketch4 → Cut-Extrude3 (cut)
    with BuildSketch(Plane.XZ):
        Polygon((40.5, -11.690598923), (40.5, -16.309401077), (44.5, -18.618802154), (48.5, -16.309401077), (48.5, -11.690598923), (44.5, -9.381197846), align=None)
        Polygon((40.355047504, 11.886928072), (44.355047504, 9.577526995), (48.355047504, 11.886928072), (48.355047504, 16.505730226), (44.355047504, 18.815131302), (40.355047504, 16.505730226), align=None)
        Polygon((-48.25, 26.309401077), (-48.25, 21.690598923), (-44.25, 19.381197846), (-40.25, 21.690598923), (-40.25, 26.309401077), (-44.25, 28.618802154), align=None)
        Polygon((-44.25, -19.131197846), (-48.25, -21.440598923), (-48.25, -26.059401077), (-44.25, -28.368802154), (-40.25, -26.059401077), (-40.25, -21.440598923), align=None)
    extrude(amount=-CUT_EXTRUDE3_DEPTH, mode=Mode.SUBTRACT)


solid = part.part
